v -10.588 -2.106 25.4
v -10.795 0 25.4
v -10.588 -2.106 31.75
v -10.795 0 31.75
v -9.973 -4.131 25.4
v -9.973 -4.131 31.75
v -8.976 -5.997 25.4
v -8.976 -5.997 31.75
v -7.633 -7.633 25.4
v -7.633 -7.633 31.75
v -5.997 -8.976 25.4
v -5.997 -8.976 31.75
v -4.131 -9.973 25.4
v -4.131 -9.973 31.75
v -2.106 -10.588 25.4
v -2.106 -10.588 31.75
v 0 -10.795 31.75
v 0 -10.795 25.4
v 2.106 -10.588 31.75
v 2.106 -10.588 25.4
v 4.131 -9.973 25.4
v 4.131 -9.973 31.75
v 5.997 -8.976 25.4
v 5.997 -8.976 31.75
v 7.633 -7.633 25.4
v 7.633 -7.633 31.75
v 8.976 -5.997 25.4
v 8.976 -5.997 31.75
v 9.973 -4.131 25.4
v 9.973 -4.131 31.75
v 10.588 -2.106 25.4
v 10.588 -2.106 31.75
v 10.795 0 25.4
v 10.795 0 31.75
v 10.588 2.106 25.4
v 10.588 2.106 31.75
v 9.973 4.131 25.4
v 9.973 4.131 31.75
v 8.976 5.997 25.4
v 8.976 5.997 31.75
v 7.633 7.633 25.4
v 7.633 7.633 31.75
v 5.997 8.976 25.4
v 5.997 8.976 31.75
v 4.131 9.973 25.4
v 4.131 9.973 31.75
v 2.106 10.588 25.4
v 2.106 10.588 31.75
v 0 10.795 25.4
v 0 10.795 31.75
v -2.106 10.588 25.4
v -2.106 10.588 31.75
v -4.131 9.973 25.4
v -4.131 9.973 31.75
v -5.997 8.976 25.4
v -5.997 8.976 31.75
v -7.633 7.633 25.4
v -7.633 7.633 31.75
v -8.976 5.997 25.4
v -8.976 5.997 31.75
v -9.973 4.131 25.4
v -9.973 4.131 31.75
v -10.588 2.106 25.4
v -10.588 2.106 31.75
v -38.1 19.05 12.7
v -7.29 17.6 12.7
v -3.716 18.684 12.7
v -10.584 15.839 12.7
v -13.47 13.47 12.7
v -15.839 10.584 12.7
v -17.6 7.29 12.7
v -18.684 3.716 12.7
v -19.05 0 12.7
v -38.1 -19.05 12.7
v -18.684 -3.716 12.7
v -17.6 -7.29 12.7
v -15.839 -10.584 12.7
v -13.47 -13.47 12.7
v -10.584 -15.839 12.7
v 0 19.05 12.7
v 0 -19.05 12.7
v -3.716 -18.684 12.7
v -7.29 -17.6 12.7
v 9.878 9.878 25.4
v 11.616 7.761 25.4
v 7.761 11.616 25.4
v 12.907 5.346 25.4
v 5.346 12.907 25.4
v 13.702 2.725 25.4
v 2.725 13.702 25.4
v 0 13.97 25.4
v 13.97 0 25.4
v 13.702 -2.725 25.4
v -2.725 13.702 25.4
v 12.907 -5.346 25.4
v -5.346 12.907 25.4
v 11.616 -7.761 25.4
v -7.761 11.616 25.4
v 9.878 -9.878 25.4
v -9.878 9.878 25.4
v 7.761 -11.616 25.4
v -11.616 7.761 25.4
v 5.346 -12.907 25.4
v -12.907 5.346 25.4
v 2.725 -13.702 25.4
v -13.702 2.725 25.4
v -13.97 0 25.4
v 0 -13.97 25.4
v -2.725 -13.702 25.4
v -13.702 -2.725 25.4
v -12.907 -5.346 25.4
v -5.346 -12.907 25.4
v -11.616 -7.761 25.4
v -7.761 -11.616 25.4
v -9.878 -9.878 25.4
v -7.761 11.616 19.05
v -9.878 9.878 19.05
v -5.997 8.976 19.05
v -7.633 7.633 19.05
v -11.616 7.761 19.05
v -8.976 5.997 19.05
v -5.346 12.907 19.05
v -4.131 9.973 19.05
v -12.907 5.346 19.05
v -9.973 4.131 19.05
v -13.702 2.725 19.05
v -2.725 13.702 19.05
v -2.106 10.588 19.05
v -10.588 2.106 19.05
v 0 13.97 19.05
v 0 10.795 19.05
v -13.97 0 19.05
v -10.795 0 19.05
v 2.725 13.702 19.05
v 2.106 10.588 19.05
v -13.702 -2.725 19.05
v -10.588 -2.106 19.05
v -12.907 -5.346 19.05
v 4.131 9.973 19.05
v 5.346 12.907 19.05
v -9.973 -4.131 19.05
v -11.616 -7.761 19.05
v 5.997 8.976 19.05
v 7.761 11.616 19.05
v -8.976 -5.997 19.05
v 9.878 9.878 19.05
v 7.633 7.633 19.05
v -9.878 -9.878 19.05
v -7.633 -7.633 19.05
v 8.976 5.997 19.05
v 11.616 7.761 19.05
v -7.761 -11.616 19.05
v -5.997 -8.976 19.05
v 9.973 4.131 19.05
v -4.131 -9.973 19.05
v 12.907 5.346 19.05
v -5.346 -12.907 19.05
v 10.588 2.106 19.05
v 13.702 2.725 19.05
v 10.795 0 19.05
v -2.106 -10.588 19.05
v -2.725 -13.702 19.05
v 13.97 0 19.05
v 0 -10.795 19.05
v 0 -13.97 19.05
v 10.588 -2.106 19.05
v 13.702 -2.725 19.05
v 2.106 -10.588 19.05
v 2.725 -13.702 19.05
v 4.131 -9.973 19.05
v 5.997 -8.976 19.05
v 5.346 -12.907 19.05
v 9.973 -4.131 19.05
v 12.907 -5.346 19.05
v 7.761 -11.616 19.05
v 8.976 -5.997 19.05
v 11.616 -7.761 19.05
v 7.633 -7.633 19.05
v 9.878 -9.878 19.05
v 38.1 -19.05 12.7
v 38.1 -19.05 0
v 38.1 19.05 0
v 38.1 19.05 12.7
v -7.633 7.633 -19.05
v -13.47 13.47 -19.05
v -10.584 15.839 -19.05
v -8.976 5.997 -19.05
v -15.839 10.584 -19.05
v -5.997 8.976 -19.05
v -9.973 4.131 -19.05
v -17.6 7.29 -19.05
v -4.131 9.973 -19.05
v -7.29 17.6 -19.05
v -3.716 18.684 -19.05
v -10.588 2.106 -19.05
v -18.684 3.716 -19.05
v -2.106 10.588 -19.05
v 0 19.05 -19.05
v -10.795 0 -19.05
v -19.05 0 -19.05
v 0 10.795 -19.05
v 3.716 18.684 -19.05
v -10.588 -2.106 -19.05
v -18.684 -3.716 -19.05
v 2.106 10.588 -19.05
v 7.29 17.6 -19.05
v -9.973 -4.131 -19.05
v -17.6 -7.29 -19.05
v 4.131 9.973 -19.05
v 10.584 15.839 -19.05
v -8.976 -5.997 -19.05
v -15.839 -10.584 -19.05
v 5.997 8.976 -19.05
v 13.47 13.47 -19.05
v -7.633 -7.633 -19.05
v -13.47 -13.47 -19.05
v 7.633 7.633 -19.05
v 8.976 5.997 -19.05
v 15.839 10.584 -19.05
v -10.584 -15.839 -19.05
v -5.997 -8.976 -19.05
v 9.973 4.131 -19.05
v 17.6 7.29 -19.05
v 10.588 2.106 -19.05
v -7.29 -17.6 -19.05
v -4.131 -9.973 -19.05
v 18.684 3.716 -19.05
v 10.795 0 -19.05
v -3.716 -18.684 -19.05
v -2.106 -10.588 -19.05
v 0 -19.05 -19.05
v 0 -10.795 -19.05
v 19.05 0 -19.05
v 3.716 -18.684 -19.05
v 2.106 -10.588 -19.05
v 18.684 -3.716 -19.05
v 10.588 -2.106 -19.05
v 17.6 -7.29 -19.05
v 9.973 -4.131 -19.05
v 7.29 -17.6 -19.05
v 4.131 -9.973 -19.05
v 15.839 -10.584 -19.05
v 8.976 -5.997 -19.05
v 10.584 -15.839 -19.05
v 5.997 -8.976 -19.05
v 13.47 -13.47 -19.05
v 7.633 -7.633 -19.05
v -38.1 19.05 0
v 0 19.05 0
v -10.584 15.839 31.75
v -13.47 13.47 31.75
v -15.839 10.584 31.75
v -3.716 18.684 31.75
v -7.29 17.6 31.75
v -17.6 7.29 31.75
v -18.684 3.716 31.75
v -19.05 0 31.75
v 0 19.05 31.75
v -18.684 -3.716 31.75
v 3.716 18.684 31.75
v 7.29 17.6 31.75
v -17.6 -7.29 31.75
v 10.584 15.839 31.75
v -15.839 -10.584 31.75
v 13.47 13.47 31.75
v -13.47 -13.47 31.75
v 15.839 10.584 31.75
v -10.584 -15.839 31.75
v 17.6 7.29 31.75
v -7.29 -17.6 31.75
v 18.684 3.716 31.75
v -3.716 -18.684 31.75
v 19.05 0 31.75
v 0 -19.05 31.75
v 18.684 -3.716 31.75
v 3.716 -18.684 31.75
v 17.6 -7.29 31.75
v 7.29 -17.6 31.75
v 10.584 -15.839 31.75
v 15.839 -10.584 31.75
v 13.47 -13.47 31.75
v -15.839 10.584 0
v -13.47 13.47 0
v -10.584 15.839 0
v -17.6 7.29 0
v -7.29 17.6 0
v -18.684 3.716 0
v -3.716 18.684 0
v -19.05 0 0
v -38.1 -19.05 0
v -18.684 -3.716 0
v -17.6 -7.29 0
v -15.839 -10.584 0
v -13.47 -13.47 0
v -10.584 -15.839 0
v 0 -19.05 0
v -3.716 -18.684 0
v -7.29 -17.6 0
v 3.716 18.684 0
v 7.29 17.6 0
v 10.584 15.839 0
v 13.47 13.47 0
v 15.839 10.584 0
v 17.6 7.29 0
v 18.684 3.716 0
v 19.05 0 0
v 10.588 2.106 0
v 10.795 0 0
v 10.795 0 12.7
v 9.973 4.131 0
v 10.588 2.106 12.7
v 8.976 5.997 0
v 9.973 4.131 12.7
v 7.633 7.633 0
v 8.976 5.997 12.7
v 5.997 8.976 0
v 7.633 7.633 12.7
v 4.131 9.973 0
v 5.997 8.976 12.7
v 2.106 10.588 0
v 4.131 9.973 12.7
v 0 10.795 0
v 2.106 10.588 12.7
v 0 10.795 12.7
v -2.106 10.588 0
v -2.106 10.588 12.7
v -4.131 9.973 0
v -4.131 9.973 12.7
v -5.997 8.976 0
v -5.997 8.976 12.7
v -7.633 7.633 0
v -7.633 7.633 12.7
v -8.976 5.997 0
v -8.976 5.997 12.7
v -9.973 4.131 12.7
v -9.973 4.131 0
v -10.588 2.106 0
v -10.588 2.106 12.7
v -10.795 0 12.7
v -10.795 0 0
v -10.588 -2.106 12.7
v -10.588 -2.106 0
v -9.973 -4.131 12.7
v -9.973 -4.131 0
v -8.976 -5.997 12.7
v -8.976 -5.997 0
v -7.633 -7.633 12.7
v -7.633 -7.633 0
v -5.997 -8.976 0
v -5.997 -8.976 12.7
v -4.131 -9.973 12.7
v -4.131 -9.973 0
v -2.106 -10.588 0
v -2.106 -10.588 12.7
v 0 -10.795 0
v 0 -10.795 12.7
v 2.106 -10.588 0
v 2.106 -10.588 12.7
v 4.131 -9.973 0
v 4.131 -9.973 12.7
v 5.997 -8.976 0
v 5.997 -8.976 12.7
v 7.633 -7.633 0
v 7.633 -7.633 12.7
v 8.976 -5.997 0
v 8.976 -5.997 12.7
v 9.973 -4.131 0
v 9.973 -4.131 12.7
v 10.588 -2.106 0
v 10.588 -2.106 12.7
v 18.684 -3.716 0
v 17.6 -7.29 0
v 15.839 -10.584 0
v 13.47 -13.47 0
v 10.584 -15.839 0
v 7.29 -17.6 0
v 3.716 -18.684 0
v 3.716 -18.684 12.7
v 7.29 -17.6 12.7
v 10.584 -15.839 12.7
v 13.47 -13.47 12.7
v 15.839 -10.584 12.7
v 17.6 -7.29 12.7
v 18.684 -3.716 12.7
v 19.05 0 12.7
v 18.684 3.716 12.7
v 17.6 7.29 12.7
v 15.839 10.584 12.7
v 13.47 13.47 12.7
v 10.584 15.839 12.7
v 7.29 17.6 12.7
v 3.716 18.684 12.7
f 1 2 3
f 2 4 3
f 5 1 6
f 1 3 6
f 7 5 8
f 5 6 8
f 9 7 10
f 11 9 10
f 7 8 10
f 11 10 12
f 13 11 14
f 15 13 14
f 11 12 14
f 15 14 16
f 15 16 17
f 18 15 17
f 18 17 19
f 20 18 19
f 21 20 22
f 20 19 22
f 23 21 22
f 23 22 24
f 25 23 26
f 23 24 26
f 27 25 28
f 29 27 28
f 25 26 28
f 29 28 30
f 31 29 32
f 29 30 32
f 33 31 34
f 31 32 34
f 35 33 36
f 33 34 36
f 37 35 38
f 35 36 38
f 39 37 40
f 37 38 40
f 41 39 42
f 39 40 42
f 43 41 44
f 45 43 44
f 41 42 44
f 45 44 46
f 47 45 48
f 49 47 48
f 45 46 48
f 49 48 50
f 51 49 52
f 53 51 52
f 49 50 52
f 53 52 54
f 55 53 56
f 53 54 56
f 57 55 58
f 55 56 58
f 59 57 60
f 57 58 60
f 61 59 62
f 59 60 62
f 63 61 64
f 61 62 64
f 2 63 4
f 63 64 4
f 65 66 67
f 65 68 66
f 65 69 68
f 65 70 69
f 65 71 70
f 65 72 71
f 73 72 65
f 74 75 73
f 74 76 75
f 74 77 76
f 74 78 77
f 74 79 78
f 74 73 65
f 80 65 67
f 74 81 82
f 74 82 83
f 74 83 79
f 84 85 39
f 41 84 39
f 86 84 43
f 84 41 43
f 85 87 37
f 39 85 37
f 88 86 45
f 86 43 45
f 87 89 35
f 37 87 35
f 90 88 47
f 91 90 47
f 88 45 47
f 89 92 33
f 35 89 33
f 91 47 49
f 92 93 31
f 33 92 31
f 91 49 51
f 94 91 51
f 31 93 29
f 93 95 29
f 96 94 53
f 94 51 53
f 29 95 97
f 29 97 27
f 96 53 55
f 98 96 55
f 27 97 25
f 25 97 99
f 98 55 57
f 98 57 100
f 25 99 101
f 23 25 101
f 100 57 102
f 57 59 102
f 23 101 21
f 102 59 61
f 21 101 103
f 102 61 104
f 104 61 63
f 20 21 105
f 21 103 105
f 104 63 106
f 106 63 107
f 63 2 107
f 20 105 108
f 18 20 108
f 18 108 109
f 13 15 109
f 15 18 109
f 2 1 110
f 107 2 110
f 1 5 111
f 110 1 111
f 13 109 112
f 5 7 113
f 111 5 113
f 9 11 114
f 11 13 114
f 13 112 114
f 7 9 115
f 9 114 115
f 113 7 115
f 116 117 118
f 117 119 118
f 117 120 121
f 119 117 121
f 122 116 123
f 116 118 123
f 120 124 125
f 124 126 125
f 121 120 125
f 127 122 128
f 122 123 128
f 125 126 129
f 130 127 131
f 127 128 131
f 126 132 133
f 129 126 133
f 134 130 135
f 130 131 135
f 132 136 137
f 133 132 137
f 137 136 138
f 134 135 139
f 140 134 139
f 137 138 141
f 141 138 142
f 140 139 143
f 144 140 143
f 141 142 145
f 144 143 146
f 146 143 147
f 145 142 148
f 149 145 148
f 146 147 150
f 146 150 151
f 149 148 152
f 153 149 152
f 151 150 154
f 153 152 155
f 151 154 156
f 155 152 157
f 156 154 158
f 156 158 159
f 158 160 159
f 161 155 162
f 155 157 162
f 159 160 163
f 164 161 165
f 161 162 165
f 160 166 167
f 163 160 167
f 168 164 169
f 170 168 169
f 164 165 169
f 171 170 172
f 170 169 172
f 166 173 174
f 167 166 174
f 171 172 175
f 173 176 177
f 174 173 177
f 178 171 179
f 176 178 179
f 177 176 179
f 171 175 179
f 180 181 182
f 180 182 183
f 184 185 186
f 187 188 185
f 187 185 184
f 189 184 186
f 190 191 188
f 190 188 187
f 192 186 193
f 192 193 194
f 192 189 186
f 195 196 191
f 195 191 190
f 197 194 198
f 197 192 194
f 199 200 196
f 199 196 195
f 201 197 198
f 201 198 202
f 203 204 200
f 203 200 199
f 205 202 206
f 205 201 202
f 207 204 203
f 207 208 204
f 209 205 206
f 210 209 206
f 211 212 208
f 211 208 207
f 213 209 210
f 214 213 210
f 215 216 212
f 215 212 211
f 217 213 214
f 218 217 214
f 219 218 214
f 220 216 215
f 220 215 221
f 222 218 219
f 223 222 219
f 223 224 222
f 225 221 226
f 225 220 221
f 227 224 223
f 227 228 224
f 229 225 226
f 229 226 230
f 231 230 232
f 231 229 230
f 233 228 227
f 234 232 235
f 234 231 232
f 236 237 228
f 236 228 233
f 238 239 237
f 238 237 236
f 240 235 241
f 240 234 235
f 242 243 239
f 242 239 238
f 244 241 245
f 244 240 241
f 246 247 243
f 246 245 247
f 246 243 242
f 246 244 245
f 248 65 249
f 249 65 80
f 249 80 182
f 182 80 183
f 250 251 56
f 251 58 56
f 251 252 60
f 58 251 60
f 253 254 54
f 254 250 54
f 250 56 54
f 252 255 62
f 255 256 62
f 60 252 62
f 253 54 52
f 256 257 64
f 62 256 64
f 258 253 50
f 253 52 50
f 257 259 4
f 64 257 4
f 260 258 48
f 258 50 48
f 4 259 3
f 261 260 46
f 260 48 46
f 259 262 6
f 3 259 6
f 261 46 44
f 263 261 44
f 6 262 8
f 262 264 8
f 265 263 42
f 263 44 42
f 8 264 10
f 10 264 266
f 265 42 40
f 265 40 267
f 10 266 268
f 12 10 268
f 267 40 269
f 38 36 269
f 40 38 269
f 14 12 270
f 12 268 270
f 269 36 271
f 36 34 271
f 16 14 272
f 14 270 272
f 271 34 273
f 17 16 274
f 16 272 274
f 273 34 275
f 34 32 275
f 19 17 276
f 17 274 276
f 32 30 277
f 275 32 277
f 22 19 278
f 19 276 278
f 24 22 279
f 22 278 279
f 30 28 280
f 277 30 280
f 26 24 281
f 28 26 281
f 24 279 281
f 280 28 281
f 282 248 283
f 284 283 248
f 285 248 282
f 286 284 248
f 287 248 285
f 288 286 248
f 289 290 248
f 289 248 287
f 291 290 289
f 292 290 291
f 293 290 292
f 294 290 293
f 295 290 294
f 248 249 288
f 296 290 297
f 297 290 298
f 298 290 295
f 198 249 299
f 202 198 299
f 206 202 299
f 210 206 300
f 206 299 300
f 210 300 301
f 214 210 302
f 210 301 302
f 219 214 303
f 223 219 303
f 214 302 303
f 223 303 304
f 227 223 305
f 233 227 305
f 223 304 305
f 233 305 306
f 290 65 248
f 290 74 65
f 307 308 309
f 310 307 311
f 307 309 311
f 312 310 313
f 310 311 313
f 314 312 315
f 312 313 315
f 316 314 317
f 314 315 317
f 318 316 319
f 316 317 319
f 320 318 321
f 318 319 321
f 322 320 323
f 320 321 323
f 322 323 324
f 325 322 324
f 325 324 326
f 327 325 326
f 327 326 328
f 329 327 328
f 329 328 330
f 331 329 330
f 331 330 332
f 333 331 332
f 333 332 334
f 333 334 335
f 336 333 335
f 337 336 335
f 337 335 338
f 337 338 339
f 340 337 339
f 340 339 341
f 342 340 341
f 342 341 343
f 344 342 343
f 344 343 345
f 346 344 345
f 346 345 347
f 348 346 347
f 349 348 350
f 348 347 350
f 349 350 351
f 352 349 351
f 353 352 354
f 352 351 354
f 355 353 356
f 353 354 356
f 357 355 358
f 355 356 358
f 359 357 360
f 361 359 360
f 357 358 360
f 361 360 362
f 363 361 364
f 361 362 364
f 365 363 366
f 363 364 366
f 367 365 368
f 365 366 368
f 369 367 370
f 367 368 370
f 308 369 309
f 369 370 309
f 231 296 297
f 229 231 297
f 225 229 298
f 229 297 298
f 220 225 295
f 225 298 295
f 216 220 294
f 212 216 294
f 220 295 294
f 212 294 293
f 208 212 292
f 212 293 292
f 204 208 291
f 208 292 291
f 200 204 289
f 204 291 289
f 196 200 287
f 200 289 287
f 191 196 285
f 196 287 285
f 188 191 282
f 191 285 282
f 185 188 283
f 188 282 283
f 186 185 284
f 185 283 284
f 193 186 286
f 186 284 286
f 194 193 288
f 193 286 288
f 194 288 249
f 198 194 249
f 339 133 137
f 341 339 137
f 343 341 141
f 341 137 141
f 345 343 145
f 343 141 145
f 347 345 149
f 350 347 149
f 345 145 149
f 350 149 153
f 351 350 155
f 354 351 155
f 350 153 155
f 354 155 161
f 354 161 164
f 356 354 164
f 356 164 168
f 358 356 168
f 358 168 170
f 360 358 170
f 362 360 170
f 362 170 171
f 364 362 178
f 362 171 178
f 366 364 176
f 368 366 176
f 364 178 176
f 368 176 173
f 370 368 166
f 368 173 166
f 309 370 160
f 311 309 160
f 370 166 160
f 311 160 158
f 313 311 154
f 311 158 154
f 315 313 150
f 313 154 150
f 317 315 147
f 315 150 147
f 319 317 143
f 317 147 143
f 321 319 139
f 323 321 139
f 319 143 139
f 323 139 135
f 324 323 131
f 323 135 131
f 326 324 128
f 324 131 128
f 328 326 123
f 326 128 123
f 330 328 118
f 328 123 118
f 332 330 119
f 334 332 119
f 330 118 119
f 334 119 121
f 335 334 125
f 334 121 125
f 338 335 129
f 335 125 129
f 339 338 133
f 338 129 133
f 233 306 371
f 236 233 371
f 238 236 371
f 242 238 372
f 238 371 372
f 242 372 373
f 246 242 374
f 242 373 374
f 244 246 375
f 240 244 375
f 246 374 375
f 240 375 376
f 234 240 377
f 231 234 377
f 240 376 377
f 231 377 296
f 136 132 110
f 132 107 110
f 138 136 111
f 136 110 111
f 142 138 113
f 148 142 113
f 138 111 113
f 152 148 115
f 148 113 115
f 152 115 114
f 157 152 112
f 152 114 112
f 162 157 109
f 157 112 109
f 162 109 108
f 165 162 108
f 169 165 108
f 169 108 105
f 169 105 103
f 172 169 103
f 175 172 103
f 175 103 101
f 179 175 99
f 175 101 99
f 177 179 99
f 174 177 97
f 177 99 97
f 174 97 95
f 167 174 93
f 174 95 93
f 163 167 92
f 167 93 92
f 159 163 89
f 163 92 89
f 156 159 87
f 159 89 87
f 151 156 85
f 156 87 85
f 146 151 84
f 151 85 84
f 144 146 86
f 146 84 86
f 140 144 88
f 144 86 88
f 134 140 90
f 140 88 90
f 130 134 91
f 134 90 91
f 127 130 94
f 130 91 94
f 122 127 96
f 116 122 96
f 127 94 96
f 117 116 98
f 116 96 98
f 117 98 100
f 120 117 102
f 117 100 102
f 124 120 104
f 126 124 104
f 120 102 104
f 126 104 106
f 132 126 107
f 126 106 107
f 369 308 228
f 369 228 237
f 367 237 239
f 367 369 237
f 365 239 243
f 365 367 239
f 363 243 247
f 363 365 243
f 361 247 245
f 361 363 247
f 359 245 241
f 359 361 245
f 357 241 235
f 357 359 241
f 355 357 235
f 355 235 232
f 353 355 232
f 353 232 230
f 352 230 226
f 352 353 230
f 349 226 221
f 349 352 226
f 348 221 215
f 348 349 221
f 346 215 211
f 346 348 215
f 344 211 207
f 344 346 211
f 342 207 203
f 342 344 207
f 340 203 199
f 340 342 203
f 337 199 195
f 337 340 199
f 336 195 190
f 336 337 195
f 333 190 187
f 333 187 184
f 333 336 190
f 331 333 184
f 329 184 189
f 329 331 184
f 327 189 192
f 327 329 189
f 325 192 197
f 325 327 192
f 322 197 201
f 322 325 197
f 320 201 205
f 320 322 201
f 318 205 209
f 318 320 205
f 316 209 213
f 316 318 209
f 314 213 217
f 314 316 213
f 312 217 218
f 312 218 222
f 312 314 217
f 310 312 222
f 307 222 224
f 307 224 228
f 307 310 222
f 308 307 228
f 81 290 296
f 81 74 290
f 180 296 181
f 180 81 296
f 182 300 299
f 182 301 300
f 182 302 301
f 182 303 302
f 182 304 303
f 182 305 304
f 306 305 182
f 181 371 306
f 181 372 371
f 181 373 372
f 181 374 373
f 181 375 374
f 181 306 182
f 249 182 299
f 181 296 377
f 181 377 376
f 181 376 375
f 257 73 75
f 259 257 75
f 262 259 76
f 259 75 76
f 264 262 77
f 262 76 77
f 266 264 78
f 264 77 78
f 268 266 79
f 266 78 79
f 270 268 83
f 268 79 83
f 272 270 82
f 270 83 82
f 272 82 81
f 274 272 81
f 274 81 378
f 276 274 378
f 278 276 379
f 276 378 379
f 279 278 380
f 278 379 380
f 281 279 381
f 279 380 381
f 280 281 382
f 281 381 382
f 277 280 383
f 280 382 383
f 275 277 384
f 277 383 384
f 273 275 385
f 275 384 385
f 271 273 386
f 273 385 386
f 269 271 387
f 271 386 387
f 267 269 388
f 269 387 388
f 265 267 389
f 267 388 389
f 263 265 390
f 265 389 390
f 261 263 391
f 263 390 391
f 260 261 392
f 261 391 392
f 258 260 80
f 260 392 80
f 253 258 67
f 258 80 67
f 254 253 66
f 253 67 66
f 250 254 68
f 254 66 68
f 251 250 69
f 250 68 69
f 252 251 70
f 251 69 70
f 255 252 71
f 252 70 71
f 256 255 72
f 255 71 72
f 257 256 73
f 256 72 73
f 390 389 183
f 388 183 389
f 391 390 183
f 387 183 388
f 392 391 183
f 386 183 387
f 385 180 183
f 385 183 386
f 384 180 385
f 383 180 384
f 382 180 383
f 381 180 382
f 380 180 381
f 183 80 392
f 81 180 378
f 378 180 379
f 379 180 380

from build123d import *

# Parameters (mm, degrees)
F1_DEPTH  = 19.05
F3_FACE_R = 10.795
F4_DEPTH  = 25.4
F5_R      = 10.795
F6_DEPTH  = 19.05


with BuildPart() as f1:
    # F0 (on Front) → F1 (new body, symmetric)
    with BuildSketch(Plane.XZ):
        Polygon((-38.1, 0), (0, 0), (38.1, 0), (38.1, 12.7), (-38.1, 12.7), align=None)
    extrude(amount=F1_DEPTH, both=True)

    # F2 (on Front) → F3 (revolve)
    with BuildSketch(Plane.XZ):
        Polygon((-19.05, 31.75), (-19.05, 12.7), (-10.795, 12.7), (-10.795, 19.05), (-13.97, 19.05), (-13.97, 25.4), (-10.795, 25.4), (-10.795, 31.75), align=None)
    revolve(axis=Axis((0, 0, 15.662436), (0, 0, 1)))

    # F3_face (on face) → F4 (cut)
    with BuildSketch(Plane.XY.offset(12.7)):
        Circle(F3_FACE_R)
    extrude(amount=-F4_DEPTH, mode=Mode.SUBTRACT)

    # F5 (on face) → F6 (join)
    with BuildSketch(Plane(origin=(0, 0, 0), x_dir=(1, 0, 0), z_dir=(0, 0, -1))):
        with BuildLine():
            ThreePointArc((0, -19.05), (13.470384, -13.470384), (19.05, 0))
            ThreePointArc((19.05, 0), (13.470384, 13.470384), (0, 19.05))
            ThreePointArc((0, 19.05), (-19.05, 0), (0, -19.05))
        make_face()
        Circle(F5_R, mode=Mode.SUBTRACT)
    extrude(amount=F6_DEPTH)


solid = f1.part
